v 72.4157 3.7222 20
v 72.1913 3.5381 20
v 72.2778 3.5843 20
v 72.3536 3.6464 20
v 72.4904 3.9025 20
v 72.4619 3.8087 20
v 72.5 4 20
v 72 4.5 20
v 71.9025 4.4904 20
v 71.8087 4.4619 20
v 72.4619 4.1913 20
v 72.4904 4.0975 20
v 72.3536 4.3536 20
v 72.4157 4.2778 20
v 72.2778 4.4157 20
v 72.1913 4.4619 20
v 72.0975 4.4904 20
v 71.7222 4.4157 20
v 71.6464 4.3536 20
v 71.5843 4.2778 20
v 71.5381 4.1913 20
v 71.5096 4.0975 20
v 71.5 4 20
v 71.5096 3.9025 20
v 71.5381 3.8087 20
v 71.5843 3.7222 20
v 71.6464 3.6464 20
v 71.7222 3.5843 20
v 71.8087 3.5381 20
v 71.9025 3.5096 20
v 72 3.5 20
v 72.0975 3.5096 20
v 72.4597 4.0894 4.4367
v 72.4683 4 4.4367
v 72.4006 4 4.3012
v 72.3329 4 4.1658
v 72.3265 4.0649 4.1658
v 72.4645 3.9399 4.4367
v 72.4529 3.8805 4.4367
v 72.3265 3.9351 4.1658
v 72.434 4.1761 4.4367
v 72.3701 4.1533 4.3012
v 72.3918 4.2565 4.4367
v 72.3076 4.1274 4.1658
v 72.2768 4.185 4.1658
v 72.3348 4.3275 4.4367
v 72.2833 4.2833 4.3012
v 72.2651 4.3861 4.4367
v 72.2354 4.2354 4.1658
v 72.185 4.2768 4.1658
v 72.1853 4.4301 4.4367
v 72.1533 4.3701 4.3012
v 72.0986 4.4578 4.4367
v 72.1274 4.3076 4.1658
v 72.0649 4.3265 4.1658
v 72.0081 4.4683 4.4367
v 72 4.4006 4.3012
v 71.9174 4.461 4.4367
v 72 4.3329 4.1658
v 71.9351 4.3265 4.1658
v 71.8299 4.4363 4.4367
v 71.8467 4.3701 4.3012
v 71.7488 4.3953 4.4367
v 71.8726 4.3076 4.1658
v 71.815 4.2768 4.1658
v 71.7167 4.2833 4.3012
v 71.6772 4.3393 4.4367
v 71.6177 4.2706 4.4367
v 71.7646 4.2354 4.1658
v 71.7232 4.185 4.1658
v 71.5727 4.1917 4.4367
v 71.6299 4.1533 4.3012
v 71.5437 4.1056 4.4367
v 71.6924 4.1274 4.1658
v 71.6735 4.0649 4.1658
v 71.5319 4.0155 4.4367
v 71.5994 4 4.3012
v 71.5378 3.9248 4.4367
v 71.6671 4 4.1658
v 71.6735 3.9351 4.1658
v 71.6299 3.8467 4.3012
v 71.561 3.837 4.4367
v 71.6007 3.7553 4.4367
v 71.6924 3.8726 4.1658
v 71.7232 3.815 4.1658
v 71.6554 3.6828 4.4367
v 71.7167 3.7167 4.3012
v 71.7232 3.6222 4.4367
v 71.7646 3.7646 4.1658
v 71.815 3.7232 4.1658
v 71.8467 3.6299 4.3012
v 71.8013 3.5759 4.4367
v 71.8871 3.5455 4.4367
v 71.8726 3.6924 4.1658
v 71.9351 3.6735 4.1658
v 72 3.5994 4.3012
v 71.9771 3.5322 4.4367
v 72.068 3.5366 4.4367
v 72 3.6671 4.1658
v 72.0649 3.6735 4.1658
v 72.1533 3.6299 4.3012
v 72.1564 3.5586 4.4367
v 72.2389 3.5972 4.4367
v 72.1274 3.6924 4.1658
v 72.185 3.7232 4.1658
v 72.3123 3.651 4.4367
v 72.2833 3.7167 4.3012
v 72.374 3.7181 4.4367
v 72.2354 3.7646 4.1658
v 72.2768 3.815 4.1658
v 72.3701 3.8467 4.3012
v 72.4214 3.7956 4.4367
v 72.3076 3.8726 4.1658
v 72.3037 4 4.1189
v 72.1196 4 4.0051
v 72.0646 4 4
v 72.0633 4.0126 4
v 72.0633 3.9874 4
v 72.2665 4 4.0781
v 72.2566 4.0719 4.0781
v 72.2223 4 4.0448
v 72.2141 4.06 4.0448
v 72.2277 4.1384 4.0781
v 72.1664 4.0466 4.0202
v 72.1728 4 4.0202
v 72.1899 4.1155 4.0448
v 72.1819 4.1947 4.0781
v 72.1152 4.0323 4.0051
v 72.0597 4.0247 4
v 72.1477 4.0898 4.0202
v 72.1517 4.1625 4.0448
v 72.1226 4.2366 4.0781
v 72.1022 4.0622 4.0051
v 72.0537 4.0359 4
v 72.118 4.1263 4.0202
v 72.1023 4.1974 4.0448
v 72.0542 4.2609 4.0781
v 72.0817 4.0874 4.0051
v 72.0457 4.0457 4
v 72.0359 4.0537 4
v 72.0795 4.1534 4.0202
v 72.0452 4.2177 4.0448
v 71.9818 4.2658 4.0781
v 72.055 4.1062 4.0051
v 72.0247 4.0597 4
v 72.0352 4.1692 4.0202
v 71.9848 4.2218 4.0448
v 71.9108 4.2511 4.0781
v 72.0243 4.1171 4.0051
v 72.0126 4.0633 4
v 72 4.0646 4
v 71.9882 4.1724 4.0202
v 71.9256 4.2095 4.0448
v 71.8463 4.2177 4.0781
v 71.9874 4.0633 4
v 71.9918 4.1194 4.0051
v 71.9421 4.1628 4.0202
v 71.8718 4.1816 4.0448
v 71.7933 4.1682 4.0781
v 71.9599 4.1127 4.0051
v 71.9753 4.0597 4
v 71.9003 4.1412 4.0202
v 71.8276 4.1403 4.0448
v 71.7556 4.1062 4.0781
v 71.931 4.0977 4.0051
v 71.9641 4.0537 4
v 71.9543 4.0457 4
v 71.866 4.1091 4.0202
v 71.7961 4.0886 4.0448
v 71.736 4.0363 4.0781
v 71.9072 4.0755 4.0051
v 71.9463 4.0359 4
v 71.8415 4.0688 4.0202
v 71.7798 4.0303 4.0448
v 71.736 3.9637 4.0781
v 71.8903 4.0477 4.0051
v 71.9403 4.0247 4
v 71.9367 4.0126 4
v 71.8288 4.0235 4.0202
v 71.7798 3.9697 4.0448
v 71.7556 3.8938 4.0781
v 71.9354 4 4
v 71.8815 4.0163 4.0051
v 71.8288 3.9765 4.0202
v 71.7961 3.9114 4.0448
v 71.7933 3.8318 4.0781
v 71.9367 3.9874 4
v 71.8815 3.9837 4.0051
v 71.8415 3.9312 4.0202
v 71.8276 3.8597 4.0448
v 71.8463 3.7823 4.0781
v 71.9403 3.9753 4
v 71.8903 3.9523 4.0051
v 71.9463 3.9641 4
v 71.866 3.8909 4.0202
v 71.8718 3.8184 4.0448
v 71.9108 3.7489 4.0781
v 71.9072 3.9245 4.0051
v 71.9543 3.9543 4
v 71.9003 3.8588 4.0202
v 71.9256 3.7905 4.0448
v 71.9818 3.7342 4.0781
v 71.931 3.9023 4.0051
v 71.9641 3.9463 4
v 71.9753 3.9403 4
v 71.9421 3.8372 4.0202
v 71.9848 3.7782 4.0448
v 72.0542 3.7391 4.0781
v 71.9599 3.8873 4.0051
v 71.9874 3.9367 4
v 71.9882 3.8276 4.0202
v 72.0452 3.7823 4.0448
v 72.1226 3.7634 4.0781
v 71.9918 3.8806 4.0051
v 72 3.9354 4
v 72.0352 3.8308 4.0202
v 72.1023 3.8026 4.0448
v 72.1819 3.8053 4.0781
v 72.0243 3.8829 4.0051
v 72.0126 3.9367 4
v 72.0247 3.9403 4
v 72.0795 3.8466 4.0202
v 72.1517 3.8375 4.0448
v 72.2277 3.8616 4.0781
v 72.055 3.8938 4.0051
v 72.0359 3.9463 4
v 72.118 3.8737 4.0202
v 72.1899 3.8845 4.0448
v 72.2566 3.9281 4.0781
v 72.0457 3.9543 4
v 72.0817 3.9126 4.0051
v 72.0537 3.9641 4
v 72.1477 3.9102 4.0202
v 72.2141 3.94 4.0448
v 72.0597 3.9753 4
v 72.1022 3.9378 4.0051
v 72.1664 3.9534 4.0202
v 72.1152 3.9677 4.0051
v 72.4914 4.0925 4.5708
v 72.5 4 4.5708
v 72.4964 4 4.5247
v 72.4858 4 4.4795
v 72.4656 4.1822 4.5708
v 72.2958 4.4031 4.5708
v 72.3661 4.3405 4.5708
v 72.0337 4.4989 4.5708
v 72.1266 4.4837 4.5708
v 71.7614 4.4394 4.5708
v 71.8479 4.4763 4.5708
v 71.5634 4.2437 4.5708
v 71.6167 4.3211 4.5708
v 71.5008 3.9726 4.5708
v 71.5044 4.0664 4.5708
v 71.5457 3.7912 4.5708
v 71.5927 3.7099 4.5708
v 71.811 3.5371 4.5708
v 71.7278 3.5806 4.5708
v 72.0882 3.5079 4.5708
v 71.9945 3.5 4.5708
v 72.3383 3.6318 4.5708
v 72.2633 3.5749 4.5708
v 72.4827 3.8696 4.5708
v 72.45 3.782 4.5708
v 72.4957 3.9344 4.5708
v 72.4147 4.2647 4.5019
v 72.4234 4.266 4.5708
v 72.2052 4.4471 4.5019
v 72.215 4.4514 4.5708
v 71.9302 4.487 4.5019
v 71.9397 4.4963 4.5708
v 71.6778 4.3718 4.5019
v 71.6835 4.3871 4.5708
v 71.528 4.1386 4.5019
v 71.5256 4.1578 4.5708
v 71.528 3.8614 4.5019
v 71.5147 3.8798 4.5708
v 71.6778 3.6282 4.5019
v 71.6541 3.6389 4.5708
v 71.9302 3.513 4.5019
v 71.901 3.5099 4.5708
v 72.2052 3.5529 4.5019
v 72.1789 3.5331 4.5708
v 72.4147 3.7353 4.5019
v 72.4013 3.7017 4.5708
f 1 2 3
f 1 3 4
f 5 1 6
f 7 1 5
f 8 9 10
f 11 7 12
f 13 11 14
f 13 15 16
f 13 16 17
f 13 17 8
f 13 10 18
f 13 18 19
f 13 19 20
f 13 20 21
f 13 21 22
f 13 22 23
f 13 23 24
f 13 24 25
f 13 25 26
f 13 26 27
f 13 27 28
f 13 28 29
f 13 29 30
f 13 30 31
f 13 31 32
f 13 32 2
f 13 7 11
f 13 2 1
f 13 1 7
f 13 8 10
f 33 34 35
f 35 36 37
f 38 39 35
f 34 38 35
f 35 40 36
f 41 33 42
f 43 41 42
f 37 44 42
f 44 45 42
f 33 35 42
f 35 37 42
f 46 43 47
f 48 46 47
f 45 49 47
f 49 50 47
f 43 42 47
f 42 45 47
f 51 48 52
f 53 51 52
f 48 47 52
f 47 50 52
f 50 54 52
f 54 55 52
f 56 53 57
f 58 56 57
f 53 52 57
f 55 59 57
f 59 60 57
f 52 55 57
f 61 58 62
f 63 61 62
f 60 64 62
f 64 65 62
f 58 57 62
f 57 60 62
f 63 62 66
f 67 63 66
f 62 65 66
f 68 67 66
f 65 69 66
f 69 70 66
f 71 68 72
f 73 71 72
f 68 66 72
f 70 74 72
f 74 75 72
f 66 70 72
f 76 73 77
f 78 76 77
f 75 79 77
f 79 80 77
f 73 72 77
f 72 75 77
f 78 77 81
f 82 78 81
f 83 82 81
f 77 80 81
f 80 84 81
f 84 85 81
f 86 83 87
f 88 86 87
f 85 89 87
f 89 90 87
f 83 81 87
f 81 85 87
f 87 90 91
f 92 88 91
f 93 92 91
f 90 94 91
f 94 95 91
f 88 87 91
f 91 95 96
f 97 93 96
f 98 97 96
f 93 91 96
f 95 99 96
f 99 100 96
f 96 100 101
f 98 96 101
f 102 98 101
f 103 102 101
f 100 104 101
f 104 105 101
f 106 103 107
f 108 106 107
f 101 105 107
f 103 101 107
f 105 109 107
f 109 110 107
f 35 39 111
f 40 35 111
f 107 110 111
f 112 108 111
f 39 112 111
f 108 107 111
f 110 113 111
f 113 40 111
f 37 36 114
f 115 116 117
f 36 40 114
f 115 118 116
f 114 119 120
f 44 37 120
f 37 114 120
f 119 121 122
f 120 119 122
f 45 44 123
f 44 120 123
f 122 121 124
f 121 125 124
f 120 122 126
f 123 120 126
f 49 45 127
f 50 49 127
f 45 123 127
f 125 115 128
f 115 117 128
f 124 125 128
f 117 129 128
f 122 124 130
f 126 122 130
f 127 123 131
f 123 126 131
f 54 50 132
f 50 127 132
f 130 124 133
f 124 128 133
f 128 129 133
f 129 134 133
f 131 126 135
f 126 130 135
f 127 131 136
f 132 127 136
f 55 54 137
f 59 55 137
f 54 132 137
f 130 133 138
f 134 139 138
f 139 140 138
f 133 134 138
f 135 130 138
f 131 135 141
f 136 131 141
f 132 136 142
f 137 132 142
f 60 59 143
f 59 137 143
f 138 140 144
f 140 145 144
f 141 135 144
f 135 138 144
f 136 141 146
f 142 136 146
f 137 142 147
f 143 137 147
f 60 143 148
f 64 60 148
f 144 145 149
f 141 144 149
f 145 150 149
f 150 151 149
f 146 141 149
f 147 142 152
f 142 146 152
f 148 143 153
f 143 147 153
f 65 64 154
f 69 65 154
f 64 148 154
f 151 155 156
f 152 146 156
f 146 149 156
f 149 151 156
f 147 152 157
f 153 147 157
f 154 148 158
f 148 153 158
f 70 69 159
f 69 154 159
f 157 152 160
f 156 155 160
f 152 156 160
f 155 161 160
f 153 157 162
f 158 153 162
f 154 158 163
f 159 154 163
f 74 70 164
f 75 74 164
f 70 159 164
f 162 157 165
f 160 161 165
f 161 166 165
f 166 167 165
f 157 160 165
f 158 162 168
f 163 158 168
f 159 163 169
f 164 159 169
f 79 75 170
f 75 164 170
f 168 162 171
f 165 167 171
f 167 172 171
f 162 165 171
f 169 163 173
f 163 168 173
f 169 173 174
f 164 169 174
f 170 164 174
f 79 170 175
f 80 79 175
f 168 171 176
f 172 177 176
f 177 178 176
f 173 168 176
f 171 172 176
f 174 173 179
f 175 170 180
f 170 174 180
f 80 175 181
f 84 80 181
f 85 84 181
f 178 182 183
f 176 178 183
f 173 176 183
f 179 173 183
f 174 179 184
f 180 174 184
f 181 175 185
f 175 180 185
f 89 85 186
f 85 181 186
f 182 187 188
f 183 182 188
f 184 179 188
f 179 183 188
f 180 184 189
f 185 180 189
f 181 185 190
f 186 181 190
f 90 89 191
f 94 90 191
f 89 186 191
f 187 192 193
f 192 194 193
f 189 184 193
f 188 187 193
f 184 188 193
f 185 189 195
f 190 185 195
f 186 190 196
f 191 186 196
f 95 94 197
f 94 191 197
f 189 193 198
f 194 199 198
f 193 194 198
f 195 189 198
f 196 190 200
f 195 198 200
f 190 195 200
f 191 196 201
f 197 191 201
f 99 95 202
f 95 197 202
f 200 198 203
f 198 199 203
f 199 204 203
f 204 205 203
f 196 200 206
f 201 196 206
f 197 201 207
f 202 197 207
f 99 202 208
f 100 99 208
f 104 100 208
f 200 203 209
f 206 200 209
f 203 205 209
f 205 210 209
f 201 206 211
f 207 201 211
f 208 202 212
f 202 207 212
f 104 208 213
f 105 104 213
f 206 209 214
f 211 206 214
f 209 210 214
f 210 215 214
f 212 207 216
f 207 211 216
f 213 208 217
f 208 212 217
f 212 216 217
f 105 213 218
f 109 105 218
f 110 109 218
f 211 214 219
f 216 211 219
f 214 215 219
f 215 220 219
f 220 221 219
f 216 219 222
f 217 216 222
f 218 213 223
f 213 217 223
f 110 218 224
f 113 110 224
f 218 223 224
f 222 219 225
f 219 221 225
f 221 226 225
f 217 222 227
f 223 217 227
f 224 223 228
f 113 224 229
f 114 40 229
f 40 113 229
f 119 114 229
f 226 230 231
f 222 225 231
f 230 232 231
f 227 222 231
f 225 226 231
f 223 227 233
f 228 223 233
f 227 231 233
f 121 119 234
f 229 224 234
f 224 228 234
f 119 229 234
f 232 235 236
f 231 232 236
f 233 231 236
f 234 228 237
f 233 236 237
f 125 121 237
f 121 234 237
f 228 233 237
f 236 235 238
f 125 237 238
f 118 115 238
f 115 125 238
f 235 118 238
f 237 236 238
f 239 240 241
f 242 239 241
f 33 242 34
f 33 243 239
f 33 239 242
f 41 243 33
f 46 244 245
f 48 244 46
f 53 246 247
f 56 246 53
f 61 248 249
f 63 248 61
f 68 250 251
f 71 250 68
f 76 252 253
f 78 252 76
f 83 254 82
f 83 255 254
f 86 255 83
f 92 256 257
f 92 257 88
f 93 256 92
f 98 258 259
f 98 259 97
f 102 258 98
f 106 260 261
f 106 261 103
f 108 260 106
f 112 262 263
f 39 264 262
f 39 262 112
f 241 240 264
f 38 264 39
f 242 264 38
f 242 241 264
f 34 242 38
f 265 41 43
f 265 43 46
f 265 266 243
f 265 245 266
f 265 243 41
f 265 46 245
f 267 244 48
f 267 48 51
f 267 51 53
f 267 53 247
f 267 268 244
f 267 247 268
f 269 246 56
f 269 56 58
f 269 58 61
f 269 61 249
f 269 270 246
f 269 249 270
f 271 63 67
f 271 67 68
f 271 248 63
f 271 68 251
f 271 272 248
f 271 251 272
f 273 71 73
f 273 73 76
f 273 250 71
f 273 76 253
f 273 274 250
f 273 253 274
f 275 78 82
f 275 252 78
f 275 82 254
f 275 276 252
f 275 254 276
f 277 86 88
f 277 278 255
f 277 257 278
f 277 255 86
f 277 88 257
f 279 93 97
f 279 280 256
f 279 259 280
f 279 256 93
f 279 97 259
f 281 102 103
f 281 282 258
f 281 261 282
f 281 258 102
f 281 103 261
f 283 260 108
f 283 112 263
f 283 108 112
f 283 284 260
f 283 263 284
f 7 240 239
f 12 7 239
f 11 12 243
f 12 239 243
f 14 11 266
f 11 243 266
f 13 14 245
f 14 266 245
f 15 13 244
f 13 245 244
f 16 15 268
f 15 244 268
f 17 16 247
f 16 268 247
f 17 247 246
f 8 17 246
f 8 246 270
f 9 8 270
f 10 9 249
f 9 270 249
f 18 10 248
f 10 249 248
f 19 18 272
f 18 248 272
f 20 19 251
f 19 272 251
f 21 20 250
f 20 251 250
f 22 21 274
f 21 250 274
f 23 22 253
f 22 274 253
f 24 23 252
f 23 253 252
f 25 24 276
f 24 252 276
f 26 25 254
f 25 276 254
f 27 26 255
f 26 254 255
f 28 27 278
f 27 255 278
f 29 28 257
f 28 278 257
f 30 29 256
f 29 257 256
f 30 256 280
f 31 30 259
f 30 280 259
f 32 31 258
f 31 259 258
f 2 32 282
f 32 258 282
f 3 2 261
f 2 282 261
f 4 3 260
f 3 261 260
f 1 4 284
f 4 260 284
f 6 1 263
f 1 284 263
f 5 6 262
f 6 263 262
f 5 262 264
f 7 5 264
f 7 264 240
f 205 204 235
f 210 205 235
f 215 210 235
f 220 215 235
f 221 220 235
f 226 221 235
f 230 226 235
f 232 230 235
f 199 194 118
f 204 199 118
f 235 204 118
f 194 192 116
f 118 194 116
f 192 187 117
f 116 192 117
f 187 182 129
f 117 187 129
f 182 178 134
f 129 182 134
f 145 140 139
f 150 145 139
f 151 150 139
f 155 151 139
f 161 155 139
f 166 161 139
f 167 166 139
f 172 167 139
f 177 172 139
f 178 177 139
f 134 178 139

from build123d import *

# Parameters (mm, degrees)
SKETCH039_R      = 0.5
PAD005_DEPTH     = 16
CHAMFER009_SIZE2 = 0.25
CHAMFER009_SIZE  = 0.5
FILLET007_R      = 0.3


with BuildPart() as part:
    # Sketch039 → Pad005 (new body)
    with BuildSketch(Plane.XY):
        Circle(SKETCH039_R)
    extrude(amount=PAD005_DEPTH)

    # Chamfer009
    chamfer009_edges = [part.edges().sort_by_distance(p)[0] for p in [
        (-0.5, 0, 0),
    ]]
    chamfer009_side = part.faces().sort_by_distance((-0.5, 0, 8))[0]
    chamfer(chamfer009_edges, length=CHAMFER009_SIZE, length2=CHAMFER009_SIZE2, reference=chamfer009_side)

    # Fillet007
    fillet007_edges = [part.edges().sort_by_distance(p)[0] for p in [
        (-0.5, 0, 0.5),
        (-0.25, 0, 0),
    ]]
    fillet(fillet007_edges, radius=FILLET007_R)


with BuildPart() as part_1:
    # Body003 placement: moved
    add(part.part.moved(Location((72, -4, 4))))


with BuildPart() as part_2:
    # Clone placement: moved
    add(part_1.part.moved(Location((-72, 4, -4))))


with BuildPart() as part_3:
    # Body004 placement: moved
    add(part_2.part.moved(Location((72, 4, 4))))


solid = part_3.part
